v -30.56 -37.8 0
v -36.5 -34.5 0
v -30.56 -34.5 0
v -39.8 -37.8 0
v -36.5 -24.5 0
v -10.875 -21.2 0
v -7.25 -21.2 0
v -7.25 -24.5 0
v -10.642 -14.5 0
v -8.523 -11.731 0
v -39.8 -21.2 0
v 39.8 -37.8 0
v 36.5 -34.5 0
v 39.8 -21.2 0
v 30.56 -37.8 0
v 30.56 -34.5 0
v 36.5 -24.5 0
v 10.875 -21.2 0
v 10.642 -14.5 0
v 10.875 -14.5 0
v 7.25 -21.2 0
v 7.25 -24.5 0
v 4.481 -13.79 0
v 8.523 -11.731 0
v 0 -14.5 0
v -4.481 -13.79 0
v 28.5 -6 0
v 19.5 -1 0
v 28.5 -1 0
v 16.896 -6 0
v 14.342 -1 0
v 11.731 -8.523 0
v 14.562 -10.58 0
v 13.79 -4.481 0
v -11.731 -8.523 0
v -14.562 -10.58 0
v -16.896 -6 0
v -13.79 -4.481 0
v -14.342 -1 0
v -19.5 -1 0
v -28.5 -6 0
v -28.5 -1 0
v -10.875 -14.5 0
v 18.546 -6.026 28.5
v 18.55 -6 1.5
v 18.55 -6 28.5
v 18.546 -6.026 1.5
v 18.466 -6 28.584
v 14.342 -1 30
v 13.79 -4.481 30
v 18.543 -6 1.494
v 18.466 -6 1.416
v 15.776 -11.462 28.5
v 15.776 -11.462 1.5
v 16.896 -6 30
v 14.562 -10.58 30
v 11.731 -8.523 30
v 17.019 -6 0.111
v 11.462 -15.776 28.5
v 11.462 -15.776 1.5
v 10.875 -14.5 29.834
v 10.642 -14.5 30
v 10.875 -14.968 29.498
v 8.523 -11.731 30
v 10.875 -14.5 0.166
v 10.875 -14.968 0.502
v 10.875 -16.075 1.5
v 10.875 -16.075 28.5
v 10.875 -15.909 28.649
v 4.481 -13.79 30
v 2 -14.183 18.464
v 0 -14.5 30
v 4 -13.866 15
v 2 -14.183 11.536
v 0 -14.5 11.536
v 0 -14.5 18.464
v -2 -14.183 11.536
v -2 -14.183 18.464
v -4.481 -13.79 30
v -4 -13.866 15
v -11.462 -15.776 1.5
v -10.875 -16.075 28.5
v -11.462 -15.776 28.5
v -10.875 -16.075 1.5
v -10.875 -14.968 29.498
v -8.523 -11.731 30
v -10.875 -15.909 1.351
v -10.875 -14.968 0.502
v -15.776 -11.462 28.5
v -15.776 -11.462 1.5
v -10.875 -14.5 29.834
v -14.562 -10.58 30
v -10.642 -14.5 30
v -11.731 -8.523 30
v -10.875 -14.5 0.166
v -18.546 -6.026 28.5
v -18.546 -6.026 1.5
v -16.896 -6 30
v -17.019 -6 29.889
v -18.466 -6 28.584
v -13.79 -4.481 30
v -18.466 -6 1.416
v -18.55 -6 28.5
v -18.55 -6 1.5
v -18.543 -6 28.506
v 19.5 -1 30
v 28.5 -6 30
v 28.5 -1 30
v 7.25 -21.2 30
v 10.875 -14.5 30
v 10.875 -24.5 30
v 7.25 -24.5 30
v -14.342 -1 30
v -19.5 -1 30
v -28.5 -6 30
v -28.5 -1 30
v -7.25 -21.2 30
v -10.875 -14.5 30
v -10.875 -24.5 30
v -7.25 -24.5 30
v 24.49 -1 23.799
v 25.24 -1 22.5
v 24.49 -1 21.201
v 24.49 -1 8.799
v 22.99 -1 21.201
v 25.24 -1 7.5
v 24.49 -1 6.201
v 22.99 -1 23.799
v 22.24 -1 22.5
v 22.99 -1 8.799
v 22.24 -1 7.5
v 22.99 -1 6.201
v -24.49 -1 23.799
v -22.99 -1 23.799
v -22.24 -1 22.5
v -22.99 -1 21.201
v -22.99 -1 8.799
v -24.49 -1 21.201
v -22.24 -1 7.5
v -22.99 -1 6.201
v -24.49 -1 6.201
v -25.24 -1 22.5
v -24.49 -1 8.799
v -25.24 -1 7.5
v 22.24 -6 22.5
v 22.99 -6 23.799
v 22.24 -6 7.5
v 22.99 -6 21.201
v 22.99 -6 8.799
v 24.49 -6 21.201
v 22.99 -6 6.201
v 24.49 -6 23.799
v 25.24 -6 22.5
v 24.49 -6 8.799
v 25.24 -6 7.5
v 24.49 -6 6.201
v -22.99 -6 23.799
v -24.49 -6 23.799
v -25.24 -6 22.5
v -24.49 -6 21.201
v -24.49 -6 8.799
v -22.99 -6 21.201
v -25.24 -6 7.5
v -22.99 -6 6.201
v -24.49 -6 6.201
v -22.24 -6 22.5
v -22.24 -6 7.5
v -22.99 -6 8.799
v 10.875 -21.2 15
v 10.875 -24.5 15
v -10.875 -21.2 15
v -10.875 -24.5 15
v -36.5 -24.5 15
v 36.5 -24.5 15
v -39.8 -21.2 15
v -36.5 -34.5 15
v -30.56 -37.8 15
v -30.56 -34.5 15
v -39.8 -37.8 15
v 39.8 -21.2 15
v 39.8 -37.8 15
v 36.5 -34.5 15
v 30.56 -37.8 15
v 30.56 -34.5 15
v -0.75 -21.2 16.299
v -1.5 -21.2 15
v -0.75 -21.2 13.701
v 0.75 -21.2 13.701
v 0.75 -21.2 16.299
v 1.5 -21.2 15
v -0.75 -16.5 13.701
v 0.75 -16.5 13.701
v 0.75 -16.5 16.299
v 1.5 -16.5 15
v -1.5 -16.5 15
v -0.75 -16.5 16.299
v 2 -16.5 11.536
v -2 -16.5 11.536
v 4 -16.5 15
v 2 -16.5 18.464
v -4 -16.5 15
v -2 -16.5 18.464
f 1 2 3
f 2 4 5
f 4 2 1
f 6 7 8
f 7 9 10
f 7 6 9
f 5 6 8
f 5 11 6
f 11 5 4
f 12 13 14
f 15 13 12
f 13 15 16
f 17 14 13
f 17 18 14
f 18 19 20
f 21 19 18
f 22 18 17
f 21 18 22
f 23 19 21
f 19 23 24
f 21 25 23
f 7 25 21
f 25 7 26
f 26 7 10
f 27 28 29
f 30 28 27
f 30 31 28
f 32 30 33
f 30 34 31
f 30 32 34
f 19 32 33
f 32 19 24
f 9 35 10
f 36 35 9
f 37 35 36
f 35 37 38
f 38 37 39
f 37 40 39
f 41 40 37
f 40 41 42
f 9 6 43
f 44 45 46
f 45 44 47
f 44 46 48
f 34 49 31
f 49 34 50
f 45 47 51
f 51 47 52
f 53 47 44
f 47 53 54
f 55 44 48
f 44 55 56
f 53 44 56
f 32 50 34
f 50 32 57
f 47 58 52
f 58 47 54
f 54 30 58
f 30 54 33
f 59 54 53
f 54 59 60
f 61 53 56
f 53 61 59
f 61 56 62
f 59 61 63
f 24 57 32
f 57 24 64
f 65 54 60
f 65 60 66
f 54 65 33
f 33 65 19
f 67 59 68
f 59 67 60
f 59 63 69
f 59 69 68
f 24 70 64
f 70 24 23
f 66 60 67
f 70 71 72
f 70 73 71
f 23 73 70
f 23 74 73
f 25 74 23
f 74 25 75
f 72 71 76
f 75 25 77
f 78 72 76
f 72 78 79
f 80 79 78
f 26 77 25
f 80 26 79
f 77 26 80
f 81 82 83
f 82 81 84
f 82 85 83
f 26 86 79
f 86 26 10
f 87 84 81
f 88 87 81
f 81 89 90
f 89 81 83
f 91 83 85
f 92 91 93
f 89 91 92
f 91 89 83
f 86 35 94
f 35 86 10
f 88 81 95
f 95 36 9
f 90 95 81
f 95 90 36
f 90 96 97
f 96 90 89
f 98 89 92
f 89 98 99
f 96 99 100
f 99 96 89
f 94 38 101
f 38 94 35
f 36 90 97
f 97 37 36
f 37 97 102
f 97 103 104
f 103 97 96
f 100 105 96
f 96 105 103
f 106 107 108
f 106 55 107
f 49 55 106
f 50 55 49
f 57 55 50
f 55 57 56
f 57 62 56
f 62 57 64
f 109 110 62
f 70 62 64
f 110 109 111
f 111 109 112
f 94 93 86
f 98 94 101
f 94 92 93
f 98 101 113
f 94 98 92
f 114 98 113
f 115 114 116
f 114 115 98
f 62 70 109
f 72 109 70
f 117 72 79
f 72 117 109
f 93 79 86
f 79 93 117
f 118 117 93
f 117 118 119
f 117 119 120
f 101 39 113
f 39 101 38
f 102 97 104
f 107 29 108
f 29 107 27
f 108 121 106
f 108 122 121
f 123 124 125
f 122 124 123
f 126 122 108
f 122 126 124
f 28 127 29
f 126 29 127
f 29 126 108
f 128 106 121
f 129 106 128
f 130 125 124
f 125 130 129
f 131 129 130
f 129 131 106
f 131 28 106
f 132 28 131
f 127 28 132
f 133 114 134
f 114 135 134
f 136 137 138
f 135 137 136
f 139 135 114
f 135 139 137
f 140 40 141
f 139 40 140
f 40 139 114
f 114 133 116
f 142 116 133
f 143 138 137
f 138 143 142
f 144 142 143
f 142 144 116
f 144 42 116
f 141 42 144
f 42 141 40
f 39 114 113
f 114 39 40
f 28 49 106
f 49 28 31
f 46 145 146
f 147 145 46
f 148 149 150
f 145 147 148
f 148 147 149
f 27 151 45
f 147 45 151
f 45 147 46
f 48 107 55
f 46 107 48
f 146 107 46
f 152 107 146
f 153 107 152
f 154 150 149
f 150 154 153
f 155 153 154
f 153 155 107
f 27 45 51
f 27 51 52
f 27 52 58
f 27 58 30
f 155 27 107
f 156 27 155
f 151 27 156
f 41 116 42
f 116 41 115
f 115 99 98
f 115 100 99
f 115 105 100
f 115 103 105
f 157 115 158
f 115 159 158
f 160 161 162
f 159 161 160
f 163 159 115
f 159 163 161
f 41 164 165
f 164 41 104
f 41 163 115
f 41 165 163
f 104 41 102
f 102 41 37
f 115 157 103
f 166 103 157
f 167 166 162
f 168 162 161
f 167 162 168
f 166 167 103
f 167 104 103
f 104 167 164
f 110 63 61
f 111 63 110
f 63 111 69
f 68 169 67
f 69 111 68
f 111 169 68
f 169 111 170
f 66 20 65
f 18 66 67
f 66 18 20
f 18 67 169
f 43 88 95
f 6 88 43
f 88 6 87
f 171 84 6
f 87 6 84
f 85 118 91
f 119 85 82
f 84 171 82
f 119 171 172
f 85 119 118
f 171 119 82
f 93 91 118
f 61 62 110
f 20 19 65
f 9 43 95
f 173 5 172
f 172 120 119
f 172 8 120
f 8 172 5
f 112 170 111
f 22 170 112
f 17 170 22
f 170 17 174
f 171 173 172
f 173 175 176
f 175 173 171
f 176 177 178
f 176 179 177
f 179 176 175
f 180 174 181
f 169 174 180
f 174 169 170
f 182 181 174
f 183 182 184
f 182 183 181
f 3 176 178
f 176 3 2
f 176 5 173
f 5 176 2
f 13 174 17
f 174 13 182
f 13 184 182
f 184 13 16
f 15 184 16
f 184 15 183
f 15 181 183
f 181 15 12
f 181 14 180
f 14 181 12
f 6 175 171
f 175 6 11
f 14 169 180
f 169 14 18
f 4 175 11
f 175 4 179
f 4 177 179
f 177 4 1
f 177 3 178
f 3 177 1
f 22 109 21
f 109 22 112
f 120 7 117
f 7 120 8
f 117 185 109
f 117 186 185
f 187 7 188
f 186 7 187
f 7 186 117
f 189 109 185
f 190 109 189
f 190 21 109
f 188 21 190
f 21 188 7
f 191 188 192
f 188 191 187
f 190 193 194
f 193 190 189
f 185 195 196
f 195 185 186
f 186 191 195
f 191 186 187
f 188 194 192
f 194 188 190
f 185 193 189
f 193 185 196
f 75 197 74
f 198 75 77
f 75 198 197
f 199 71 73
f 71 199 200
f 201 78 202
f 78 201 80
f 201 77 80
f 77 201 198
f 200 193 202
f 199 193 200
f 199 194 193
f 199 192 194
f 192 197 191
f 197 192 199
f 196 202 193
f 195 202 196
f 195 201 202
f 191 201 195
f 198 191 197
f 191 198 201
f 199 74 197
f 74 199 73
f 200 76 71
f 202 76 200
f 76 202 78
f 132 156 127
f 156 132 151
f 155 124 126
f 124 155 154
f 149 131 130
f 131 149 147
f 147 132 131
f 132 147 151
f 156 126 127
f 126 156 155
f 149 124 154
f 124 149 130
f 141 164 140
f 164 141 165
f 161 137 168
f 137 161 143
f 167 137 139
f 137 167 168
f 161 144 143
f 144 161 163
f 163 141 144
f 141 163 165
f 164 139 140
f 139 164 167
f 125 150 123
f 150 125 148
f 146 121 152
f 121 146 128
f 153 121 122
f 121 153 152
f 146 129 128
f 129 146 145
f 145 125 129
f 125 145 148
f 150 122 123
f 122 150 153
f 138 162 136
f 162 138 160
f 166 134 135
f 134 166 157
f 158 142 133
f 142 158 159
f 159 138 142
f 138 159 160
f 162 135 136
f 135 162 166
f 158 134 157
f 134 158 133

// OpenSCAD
quality = 20; // 200 for final export...

c_post_size = 29;          			// Size of Bike post to fit (mine is 28mmx29mm)
c_gap = c_post_size / 2;

c_height = 30;							// How tall to make clamp side
c_thickness = 5;						// How thick (around post)
c_edge = 1.5;								// Bevel edge size

c_tab_mult = c_thickness * 2.8;		// Width of side tabs (relative)
c_hole_radius = 1.5;					// Radius of screw holes

c_phone_height = 10;					// Height of phone above post

c_phone_width = 73;					// Width between side clamps
c_phone_clamp_length = 100;		// Length of clamp arm
c_phone_thickness = 14 + 4;				// Thickness -- TODO: This is off by some amount (4mm for my phone) 

c_bracket_thickness = c_thickness * .66;
c_bracket_tab = c_tab_mult * .66;

difference()
{
	// Additive items within union...
	union()
	{

		// Main circle
		rotate_extrude($fn=quality)
			translate([c_gap, 0, 0])
				polygon( points=[[0,0],
					[c_thickness - c_edge, 0],
					[c_thickness, c_edge],
					[c_thickness, c_height-c_edge],
					[c_thickness - c_edge, c_height],
					[0, c_height]] );

		// 'left' tab
		translate([c_gap, - (c_thickness + 1), 0])
			cube([c_tab_mult, c_thickness, c_height], center=false);

		// 'right' tab
		translate([-(c_gap + c_tab_mult), - (c_thickness + 1), 0])
			cube([c_tab_mult, c_thickness, c_height], center=false);

		// Phone height block
		translate([-(c_post_size * 1.5/4), -(c_phone_height + c_gap), 0])
			cube([c_post_size * 3/4, c_phone_height, c_height], center=false);

		linear_extrude(height = c_height / 2, center = false, convexity = 10, twist = 0, slices = 20, scale = 1.0) 
		{
			// build the right profile for the phone params:
			// (c_phone_width, c_phone_thickness)

			translate([-(c_phone_width/2), -(c_gap+c_phone_height), 0])
				polygon( points=[[0,0], 
						[c_phone_width, 0],
[c_phone_width, -c_phone_height],
[c_phone_width+c_bracket_thickness-c_bracket_tab, -c_phone_height],
[c_phone_width+c_bracket_thickness-c_bracket_tab, -c_phone_height-c_bracket_thickness],
[c_phone_width+c_bracket_thickness, -c_phone_height-c_bracket_thickness],
[c_phone_width+c_bracket_thickness, c_bracket_thickness],
						[c_phone_width, c_bracket_thickness], 
						[0, c_bracket_thickness],
[-c_bracket_thickness, c_bracket_thickness],
[-c_bracket_thickness, -c_phone_height-c_bracket_thickness],
[c_bracket_tab-c_bracket_thickness, -c_phone_height-c_bracket_thickness],
[c_bracket_tab-c_bracket_thickness, -c_phone_height],
[0, -c_phone_height],

				] );
		}
	}

	// Subtractive 'difference' items below...
		linear_extrude(height = c_height, center = false, convexity = 10, twist = 0, slices = 20, scale = 1.0) 
		{
			// build the right profile for the phone params:
			// (c_phone_width, c_phone_thickness)

			translate([-(c_post_size*1/4), -(c_gap+c_phone_height), 0])
				polygon( points=[[0,0],
					[0,c_bracket_thickness], 
					[c_post_size*1/2,c_bracket_thickness], 
					[c_post_size*1/2, 0]
				]);

		}

	translate([0, 0, c_height/2])
		rotate([90, 0, 0])
			cylinder(c_post_size+c_phone_height+10, c_hole_radius, c_hole_radius, $fn=quality / 3, center=true);

	translate([0, 0, c_height/2])
		rotate([90, 0, 0])
			cylinder(c_post_size+4, 4, 4, $fn=6, center=true);
/*
	translate([0, 0, 0])
		rotate([90, 0, 0])
			cylinder(c_thickness * 2 + 2, c_hole_radius, c_hole_radius, $fn=quality / 3, center=true);
*/

	// Screw holes
	translate([c_gap + (c_tab_mult * .66), c_thickness + 1, (c_height / 4)])
		rotate([90, 0, 0])
			cylinder(c_thickness * 2 + 2, c_hole_radius, c_hole_radius, $fn=quality / 3);

	translate([-(c_gap + (c_tab_mult * .66)), c_thickness + 1, (c_height / 4)])
		rotate([90, 0, 0])
			cylinder(c_thickness * 2 + 2, c_hole_radius, c_hole_radius, $fn=quality / 3);


	translate([c_gap + (c_tab_mult * .66), c_thickness + 1, (c_height - c_height / 4)])
		rotate([90, 0, 0])
			cylinder(c_thickness * 2 + 2, c_hole_radius, c_hole_radius, $fn=quality / 3);

	translate([-(c_gap + (c_tab_mult * .66)), c_thickness + 1, (c_height - c_height / 4)])
		rotate([90, 0, 0])
			cylinder(c_thickness * 2 + 2, c_hole_radius, c_hole_radius, $fn=quality / 3);

	// Remove unused half clamp
	translate([-(c_gap+c_thickness), -1, 0])
		cube([(c_gap + c_thickness) * 2, (c_gap + c_thickness + 1) * 2, c_height], center=false);


}
